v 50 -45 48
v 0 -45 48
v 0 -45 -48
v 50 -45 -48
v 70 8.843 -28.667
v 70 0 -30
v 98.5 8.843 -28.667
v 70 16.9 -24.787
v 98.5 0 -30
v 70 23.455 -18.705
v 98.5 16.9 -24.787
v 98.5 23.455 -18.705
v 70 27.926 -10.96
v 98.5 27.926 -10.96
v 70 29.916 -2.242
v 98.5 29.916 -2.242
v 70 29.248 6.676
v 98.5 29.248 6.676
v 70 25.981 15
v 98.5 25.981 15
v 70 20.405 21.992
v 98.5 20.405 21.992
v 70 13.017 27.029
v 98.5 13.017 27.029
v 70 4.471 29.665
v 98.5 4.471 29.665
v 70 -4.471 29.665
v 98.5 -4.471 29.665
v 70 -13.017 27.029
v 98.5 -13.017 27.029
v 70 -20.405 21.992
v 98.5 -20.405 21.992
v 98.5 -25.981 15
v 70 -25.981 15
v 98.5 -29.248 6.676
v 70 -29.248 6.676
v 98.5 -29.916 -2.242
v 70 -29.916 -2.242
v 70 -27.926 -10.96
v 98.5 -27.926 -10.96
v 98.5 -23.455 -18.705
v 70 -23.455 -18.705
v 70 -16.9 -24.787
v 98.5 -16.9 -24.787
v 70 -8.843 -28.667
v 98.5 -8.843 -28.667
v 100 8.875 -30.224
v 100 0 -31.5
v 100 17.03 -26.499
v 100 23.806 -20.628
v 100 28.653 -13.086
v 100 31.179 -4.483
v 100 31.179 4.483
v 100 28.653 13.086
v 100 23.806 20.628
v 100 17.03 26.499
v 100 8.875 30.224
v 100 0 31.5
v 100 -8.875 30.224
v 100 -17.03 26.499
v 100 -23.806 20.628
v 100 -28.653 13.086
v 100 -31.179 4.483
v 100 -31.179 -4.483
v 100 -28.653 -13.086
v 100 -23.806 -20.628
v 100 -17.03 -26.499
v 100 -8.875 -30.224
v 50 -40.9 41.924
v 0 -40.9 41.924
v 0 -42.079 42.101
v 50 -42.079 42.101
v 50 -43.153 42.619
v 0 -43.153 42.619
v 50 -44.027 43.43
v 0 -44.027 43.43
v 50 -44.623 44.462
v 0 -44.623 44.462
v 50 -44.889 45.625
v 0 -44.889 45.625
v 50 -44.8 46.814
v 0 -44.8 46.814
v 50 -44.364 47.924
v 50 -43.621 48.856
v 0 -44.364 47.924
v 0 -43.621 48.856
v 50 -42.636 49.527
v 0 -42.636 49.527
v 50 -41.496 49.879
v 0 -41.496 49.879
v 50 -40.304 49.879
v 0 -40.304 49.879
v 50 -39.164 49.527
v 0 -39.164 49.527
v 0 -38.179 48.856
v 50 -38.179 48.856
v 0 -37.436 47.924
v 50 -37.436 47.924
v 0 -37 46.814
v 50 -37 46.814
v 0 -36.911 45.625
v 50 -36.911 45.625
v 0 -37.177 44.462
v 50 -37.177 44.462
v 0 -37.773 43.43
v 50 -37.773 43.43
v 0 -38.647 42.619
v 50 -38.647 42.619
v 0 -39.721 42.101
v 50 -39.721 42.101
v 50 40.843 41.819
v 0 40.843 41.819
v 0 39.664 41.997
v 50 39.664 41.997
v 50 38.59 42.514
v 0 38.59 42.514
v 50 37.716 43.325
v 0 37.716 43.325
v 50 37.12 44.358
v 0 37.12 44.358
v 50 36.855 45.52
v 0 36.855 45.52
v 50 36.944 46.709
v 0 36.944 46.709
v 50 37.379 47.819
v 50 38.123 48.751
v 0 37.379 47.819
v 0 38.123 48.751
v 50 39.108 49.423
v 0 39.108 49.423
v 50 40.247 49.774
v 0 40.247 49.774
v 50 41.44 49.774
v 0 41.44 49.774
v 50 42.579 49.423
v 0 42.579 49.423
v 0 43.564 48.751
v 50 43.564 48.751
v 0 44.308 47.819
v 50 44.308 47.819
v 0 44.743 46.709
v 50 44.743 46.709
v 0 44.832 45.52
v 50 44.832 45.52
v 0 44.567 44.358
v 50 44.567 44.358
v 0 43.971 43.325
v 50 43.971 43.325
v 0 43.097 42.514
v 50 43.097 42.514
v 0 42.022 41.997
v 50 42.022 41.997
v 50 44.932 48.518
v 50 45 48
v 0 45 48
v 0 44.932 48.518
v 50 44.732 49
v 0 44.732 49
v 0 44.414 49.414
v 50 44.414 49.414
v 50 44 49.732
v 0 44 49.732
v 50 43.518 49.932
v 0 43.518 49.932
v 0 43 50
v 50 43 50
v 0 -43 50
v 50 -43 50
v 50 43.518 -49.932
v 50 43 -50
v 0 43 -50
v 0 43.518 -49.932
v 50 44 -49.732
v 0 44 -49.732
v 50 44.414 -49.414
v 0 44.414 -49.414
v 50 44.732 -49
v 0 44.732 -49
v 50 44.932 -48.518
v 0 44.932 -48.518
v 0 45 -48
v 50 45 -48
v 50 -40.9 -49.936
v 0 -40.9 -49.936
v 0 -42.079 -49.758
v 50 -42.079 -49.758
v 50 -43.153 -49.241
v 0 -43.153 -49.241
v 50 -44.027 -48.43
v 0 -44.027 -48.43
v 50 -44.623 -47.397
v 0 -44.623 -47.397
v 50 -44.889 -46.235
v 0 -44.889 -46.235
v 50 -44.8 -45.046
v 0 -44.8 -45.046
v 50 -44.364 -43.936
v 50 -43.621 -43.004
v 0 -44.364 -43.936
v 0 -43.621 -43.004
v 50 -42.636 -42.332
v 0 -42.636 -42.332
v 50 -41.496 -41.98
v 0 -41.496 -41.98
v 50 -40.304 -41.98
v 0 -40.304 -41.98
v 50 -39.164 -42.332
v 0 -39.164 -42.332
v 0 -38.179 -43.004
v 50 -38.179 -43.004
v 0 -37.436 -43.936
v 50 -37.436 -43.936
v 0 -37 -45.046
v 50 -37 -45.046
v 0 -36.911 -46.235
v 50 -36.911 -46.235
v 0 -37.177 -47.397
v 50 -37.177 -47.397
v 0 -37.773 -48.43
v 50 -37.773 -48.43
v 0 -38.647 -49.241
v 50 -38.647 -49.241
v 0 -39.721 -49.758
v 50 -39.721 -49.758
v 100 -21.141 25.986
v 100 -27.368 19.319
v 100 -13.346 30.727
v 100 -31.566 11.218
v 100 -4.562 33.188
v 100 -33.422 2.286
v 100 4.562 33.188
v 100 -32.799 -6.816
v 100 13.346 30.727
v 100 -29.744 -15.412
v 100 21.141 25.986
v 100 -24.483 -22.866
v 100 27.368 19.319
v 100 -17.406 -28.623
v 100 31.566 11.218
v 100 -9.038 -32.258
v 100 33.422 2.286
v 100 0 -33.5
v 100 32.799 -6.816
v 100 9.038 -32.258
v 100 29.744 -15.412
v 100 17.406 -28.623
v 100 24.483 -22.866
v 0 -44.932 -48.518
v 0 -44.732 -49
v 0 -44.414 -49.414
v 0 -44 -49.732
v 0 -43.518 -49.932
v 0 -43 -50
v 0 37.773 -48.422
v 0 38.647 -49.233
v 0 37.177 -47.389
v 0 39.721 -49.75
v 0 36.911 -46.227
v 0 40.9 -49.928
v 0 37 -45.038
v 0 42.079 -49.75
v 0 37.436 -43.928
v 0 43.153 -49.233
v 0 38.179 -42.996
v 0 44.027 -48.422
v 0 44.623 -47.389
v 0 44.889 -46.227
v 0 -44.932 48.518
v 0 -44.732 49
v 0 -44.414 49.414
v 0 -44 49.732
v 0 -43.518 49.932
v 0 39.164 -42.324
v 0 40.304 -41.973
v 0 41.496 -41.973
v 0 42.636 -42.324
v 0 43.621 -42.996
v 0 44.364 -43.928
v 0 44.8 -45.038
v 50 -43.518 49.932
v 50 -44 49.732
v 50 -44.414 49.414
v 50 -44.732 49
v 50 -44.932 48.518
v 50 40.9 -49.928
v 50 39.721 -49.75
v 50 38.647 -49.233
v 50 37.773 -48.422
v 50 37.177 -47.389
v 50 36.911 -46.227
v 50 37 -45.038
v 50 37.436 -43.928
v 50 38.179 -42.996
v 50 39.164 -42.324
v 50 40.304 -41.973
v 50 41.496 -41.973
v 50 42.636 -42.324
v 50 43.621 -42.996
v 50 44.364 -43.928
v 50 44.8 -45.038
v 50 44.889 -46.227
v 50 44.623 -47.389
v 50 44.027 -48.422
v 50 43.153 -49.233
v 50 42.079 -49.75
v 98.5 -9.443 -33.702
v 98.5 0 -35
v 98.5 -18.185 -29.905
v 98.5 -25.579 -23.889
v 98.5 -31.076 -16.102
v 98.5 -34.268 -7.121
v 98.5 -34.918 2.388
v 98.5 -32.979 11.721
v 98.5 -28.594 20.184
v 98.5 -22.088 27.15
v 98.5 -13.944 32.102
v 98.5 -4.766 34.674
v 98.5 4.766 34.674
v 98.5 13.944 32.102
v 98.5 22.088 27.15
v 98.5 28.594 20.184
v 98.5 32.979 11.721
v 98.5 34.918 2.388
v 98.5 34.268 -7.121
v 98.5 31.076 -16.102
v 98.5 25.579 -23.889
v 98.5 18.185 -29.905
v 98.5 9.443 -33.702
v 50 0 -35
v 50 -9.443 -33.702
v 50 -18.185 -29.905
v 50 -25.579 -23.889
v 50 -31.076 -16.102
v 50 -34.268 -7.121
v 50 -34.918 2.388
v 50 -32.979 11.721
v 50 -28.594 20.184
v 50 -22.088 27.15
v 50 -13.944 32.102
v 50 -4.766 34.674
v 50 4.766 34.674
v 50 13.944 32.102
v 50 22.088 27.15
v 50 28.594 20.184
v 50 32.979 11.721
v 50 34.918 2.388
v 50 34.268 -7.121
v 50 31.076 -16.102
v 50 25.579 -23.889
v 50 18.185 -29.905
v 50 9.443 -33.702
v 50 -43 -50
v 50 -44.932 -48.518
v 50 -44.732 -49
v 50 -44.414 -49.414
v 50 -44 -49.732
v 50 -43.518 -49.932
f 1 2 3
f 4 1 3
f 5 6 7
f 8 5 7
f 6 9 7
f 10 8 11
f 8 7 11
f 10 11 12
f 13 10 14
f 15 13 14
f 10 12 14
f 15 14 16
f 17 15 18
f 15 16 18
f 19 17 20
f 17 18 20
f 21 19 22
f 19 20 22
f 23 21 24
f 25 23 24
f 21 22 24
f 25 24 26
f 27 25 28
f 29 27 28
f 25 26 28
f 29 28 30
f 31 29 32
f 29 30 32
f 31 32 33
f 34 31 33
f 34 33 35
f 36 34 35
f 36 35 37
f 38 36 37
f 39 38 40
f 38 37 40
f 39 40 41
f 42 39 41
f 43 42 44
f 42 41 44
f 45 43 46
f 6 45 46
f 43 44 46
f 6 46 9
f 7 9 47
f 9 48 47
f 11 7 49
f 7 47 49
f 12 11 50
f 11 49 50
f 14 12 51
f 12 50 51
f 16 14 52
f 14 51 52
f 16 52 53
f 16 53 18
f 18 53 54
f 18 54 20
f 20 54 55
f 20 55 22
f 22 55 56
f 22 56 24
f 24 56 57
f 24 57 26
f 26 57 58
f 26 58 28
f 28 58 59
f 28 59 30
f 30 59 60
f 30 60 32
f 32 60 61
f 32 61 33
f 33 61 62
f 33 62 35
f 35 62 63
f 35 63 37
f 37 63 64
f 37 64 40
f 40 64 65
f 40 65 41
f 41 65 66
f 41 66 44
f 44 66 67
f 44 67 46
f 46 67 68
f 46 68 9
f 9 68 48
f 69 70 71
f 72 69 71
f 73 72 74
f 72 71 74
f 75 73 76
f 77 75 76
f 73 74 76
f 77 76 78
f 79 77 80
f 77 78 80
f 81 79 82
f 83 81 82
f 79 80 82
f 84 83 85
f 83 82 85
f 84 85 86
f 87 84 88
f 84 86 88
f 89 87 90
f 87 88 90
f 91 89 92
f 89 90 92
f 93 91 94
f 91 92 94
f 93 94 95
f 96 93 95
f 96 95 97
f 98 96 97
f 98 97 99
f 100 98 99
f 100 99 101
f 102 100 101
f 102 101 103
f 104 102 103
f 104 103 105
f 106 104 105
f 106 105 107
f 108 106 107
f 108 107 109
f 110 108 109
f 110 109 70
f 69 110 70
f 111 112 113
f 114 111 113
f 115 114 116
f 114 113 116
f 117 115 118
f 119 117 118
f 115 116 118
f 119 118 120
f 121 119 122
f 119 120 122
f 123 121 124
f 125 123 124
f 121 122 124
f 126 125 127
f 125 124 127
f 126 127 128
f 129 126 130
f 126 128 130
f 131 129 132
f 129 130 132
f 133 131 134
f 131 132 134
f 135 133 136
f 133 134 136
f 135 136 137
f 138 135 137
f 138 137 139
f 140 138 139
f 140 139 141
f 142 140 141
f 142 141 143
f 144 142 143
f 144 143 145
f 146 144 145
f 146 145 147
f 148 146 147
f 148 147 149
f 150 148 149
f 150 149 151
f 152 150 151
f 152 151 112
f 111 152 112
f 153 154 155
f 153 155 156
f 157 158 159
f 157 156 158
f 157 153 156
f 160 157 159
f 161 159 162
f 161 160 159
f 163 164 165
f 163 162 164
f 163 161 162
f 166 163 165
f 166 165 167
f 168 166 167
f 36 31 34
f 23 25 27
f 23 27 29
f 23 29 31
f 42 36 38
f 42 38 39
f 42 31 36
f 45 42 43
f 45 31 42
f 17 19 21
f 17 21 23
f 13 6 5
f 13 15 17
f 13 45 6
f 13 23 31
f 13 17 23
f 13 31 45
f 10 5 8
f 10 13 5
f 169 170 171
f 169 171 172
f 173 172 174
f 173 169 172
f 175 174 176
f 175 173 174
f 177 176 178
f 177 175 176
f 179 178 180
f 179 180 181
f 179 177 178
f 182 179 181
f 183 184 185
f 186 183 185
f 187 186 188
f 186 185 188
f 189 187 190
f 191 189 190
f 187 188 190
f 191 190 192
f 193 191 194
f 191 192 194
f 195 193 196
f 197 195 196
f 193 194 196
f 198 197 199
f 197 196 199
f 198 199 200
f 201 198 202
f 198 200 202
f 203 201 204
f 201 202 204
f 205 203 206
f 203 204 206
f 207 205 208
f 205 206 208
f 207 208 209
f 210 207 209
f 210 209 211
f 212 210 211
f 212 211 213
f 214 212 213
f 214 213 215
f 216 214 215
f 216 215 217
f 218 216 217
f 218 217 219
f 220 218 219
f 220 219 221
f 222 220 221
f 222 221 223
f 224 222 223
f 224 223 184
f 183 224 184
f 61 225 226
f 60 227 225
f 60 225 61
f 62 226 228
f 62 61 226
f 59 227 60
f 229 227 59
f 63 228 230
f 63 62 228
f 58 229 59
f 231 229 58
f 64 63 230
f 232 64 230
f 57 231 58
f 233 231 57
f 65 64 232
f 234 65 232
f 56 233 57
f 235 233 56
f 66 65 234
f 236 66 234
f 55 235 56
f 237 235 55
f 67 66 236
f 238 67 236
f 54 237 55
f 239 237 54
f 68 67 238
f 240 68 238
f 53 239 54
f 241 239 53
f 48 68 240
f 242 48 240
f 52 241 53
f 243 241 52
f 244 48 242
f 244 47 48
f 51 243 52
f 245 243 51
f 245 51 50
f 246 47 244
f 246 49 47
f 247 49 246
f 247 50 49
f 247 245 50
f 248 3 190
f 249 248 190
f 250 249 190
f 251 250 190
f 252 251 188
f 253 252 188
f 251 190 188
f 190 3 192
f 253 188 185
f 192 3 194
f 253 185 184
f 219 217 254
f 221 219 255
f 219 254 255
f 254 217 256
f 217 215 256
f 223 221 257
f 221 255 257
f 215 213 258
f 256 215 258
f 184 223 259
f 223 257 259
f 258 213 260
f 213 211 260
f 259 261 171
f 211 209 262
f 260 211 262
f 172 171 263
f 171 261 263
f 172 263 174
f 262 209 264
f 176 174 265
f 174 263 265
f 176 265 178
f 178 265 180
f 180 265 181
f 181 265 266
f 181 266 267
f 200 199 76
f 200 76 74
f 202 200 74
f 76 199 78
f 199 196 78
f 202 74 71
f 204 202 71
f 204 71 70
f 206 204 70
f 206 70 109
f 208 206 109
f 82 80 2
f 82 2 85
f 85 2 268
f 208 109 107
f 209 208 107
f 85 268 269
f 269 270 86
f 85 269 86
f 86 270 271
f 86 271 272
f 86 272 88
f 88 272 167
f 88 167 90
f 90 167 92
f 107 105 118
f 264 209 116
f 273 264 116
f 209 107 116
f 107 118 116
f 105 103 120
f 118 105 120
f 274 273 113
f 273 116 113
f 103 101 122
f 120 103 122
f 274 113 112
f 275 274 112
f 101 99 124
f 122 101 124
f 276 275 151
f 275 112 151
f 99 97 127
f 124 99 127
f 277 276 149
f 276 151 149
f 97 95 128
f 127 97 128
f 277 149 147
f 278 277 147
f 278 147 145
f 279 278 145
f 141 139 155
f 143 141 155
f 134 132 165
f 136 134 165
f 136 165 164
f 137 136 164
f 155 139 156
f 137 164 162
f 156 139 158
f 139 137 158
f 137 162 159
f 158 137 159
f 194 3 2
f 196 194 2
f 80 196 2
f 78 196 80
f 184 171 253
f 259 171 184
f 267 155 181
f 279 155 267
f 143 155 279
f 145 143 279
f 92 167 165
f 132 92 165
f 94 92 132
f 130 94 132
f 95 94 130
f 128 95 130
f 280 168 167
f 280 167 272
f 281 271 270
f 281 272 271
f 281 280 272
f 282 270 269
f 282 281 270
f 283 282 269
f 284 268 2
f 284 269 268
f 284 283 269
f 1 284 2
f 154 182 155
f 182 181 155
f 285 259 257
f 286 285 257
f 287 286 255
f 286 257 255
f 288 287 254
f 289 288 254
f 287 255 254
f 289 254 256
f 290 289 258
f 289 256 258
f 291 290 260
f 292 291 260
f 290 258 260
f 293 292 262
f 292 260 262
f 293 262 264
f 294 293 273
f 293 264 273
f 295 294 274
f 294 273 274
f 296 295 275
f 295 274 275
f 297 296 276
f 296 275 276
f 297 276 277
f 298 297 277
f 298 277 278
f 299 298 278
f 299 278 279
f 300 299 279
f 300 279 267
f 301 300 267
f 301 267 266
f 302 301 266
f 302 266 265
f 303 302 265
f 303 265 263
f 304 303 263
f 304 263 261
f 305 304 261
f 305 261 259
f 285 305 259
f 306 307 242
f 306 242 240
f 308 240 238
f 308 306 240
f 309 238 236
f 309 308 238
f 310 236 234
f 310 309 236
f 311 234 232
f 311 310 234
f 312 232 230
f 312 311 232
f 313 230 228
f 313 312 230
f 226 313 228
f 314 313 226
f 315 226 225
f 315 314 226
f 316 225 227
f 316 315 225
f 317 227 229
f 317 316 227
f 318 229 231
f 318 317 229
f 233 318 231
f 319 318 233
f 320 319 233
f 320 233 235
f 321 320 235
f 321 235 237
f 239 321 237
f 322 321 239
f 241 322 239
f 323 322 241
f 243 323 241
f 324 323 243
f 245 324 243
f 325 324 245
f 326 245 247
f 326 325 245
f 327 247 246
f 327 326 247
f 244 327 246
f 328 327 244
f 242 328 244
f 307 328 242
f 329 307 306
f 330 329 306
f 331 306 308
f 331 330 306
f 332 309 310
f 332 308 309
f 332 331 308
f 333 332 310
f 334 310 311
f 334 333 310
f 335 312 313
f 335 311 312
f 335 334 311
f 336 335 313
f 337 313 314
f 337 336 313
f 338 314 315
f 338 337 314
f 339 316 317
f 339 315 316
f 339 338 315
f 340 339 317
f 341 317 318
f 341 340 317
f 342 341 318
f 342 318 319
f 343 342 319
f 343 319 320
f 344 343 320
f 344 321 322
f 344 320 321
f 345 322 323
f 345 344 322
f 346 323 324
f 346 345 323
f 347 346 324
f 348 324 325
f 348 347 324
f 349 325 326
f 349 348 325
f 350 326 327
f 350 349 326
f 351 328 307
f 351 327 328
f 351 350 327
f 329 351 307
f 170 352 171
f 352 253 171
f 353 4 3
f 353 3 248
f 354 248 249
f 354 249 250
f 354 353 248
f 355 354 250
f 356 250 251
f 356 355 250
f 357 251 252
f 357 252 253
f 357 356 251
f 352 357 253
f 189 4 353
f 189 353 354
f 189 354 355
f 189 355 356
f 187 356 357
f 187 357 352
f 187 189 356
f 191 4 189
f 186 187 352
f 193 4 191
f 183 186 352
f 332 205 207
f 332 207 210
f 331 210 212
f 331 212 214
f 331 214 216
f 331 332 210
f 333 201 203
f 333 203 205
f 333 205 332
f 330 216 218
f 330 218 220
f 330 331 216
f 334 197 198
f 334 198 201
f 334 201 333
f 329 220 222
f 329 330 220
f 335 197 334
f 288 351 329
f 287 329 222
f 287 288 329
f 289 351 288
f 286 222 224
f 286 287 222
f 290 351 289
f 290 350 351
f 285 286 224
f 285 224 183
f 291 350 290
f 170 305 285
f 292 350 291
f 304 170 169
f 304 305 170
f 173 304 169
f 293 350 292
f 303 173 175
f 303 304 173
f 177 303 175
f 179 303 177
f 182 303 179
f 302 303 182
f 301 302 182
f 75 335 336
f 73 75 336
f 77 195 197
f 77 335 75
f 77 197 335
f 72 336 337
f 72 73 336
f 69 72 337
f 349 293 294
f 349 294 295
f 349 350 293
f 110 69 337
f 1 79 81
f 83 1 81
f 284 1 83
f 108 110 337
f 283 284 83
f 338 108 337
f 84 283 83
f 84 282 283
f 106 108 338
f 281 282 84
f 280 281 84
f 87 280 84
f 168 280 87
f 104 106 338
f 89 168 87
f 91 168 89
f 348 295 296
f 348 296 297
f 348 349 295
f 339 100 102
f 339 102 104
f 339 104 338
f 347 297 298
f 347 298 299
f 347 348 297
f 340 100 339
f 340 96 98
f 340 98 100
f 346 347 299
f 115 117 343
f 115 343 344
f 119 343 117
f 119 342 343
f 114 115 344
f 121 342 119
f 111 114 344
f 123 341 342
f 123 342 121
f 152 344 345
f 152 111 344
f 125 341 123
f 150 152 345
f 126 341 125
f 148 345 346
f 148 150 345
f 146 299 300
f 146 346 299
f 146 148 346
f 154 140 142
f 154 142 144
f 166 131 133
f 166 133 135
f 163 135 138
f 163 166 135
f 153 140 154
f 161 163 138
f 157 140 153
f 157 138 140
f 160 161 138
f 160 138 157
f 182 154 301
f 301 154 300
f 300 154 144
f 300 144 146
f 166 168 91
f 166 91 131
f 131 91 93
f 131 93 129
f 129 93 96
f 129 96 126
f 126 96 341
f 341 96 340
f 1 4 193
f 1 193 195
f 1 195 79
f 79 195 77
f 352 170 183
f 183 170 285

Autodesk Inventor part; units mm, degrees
ref_plane "YZ Plane" through (0, 0, 0) normal (1, 0, 0) x (0, 1, 0)
ref_plane "XZ Plane" through (0, 0, 0) normal (0, 1, 0) x (-1, 0, 0)
ref_plane "XY Plane" through (0, 0, 0) normal (0, 0, 1) x (1, 0, 0)
sketch "Boceto1" plane through (0, 0, 0) normal (1, 0, 0) x (0, 1, 0)
  line L0 (-45, -50) -> (45, -50)
  line L1 (45, -50) -> (45, 50)
  line L2 (45, 50) -> (-45, 50)
  line L3 (-45, 50) -> (-45, -50)
  line L4 (-45, -50) -> (45, 50) construction
  line L5 (45, -50) -> (-45, 50) construction
  point P0 (0, 0)
  dimension "d0" = 90
  dimension "d1" = 100
extrude "Extrusión1" add sketch "Boceto1" along normal blind 50
sketch "Boceto2" plane through (50, 0, 0) normal (1, 0, 0) x (0, 0, -1)
  circle A0 centre (0, 0) radius 35
  dimension "d4" = 70
extrude "Extrusión2" add sketch "Boceto2" along normal blind 50
sketch "Boceto3" plane through (100, 0, 0) normal (1, 0, 0) x (0, 0, -1)
  circle A0 centre (0, 0) radius 30
  dimension "d7" = 60
extrude "Extrusión3" cut sketch "Boceto3" against normal blind 30
chamfer "Chaflán1" distance 1.5 angle 45 2 edges at (100, 0, 35) (100, 0, 30)
sketch "Boceto4" plane through (50, 0, 0) normal (1, 0, 0) x (0, 0, -1)
  point P0 (0, 0)
fillet "Empalme1" radius 2 4 edges at (25, 45, 50) (25, -45, 50) (25, 45, -50) (25, -45, -50)
sketch "Boceto5" plane through (50, 0, 0) normal (1, 0, 0) x (0, 0, -1)
  point P0 (0, 0)
  point P1 (-45.8189, 40.8434)
hole "Agujero1" at (50, 40.8434, 45.8189) direction (-1, 0, 0) diameter 8 end through all
sketch "Boceto6" plane through (50, 0, 0) normal (1, 0, 0) x (0, 0, -1)
  line L0 (48, 45) -> (-48, 45) projected
  point P0 (0, 0)
  point P1 (45.9279, 40.9)
  dimension "d21" = 4.1
hole "Agujero2" at (50, 40.9, -45.9279) direction (-1, 0, 0) diameter 8 end through all
sketch "Boceto7" plane through (50, 0, 0) normal (1, 0, 0) x (0, 0, -1)
  line L0 (-48, -45) -> (48, -45) projected
  point P0 (0, 0)
  point P1 (-45.9235, -40.9)
  dimension "d29" = 4.1
hole "Agujero3" at (50, -40.9, 45.9235) direction (-1, 0, 0) diameter 8 end through all
sketch "Boceto8" plane through (50, 0, 0) normal (1, 0, 0) x (0, 0, -1)
  line L0 (-48, -45) -> (48, -45) projected
  point P0 (0, 0)
  point P1 (45.9358, -40.9)
  dimension "d37" = 4.1
hole "Agujero4" at (50, -40.9, -45.9358) direction (-1, 0, 0) diameter 8 end through all
properties part number "TAREA 1 LAB DINAMICA 1168717"
